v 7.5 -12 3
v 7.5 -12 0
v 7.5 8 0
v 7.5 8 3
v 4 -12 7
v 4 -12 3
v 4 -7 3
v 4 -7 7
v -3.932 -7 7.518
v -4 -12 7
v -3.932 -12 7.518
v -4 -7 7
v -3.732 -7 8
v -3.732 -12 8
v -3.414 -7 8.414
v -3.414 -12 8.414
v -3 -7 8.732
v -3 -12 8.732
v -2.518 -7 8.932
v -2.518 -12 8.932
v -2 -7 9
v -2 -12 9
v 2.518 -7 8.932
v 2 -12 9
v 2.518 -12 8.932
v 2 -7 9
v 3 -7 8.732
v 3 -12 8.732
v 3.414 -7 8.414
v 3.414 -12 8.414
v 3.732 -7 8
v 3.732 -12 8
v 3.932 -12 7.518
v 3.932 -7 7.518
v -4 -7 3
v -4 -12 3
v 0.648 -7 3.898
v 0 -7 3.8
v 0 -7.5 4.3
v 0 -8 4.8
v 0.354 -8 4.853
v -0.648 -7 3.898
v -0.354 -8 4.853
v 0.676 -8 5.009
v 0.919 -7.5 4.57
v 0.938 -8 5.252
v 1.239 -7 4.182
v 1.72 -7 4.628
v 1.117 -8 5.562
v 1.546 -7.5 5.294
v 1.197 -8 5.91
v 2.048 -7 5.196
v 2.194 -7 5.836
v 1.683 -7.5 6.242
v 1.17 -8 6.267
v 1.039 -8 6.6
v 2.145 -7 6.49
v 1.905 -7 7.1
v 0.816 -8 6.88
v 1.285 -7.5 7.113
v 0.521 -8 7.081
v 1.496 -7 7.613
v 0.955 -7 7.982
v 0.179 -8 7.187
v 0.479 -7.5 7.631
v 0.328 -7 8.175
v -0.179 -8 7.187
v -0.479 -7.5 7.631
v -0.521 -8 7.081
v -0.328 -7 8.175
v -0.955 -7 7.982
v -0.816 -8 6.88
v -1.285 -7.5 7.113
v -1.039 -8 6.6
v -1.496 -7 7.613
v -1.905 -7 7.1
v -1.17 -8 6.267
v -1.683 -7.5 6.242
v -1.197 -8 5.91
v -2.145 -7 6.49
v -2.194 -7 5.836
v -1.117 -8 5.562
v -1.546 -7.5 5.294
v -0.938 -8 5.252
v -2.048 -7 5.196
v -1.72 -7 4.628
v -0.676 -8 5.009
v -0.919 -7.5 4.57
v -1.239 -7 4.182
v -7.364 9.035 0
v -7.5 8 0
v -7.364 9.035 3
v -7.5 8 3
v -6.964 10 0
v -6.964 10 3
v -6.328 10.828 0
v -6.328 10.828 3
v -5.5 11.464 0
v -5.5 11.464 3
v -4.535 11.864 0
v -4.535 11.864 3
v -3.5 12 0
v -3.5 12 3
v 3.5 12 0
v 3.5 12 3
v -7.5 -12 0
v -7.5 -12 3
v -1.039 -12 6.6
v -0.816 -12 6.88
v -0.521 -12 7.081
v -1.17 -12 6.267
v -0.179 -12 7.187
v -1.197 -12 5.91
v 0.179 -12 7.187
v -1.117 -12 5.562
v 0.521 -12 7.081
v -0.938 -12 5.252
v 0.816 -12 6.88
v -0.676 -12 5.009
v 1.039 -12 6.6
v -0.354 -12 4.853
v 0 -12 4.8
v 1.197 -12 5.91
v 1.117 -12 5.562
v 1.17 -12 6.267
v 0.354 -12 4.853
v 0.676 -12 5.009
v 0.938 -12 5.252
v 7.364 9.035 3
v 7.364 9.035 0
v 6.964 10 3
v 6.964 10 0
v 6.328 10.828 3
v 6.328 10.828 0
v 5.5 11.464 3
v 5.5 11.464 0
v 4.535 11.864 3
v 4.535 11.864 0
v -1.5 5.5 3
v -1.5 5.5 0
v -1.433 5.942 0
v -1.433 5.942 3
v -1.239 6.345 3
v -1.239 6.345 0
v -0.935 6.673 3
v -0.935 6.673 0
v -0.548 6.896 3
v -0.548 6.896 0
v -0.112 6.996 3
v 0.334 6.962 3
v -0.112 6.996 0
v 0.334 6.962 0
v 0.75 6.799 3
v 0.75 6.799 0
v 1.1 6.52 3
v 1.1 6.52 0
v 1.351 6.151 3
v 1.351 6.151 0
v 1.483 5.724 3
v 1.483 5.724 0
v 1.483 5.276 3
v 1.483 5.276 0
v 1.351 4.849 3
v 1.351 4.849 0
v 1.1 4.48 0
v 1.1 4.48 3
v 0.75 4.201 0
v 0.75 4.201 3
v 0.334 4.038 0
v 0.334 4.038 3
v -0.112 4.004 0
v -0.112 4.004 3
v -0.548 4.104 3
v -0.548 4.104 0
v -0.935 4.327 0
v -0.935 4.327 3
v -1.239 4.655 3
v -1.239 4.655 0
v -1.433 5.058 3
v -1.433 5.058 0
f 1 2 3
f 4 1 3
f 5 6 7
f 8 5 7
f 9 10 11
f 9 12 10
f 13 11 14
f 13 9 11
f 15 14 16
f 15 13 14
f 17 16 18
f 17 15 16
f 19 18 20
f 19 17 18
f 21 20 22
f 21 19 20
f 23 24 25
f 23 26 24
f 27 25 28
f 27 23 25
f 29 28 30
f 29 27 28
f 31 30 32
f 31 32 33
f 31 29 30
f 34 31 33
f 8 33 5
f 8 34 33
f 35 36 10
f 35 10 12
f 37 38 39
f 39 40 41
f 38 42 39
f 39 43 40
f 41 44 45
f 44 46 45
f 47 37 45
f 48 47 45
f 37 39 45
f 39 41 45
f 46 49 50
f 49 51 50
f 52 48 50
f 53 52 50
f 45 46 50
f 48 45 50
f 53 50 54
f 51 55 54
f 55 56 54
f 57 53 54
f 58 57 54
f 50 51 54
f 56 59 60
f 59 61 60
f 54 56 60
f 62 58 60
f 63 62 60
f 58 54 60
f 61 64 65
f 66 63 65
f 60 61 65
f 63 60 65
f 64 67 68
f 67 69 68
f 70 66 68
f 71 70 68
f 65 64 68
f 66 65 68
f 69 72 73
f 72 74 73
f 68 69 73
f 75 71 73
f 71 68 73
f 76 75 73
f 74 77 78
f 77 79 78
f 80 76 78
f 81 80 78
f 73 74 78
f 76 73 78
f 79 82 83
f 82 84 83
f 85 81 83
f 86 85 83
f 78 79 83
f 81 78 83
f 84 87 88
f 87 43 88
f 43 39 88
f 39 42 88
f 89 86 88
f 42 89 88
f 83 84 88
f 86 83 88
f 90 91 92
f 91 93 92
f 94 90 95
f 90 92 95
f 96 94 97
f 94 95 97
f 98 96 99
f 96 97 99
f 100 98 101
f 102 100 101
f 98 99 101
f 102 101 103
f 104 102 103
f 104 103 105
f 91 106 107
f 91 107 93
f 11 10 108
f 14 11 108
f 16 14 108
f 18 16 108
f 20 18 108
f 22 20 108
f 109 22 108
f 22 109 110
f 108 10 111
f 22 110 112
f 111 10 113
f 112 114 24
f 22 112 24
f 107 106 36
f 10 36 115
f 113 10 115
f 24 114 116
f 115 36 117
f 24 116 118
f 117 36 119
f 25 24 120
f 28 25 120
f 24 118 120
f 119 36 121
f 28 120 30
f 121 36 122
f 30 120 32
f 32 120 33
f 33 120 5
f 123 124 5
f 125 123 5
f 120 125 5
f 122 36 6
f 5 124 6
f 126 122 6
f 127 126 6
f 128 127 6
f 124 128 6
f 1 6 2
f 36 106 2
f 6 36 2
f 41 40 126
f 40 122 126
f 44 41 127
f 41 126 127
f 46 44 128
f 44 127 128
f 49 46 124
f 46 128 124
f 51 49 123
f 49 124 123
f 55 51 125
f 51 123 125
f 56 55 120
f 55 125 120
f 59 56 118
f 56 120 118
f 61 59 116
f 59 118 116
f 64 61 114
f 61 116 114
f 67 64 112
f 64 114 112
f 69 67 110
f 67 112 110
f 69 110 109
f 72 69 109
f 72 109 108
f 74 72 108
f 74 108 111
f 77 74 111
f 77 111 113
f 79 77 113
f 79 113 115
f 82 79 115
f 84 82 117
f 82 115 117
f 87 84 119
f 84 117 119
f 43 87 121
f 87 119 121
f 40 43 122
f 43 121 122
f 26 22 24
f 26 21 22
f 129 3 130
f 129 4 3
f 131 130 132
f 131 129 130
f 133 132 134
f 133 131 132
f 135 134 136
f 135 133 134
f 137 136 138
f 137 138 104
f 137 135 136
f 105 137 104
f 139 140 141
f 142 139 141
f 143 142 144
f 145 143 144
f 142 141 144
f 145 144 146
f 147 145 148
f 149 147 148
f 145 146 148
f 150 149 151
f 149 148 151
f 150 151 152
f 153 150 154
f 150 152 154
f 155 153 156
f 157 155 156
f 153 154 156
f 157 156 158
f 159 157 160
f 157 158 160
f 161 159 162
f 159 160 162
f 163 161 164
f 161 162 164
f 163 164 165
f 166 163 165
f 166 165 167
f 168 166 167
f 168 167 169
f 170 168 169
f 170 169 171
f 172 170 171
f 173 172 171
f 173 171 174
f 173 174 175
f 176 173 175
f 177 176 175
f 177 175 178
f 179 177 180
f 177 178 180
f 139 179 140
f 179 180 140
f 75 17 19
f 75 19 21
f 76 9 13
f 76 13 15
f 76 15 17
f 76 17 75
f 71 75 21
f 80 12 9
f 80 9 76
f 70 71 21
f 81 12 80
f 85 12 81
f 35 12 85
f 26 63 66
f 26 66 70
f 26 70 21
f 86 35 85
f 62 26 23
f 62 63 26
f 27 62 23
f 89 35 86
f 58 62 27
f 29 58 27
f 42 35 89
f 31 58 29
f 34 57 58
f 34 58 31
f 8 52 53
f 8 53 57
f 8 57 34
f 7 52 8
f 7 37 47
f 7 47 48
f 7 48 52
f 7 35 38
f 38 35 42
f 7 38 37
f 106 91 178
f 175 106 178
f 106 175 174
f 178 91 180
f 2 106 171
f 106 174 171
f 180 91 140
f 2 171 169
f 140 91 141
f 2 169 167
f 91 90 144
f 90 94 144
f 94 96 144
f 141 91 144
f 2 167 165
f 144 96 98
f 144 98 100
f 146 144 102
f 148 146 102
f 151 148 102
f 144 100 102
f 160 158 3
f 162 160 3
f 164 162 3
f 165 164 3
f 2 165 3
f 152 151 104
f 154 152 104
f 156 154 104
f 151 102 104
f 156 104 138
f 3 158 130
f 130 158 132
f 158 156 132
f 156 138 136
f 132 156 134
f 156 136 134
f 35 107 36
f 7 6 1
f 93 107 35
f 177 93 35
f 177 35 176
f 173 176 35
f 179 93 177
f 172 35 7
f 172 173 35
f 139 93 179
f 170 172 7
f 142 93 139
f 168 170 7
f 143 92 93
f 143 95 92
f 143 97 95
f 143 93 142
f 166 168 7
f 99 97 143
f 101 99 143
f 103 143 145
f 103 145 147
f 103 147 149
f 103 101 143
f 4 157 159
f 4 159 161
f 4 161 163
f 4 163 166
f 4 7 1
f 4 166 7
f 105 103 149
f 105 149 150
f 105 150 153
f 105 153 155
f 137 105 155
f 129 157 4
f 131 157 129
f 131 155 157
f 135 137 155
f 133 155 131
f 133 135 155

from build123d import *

# Parameters (mm, degrees)
SKETCH1_W                                       = 15
SKETCH1_H                                       = 24
BOSS_EXTRUDE1_DEPTH                             = 3
SKETCH2_W                                       = 8
SKETCH2_H                                       = 5
BOSS_EXTRUDE2_DEPTH                             = 6
CSK_FOR_M2_FLAT_HEAD_MACHINE_SCREW1_D           = 2.4
CSK_FOR_M2_FLAT_HEAD_MACHINE_SCREW1_CSINK_D     = 4.4
CSK_FOR_M2_FLAT_HEAD_MACHINE_SCREW1_CSINK_ANGLE = 90
FILLET1_R                                       = 2
SKETCH5_R                                       = 1.5
CUT_EXTRUDE1_DEPTH                              = 3
FILLET2_R                                       = 4


with BuildPart() as part:
    # Sketch1 → Boss-Extrude1 (new body)
    with BuildSketch(Plane.XY):
        Rectangle(SKETCH1_W, SKETCH1_H)
    extrude(amount=BOSS_EXTRUDE1_DEPTH)

    # Sketch2 → Boss-Extrude2 (add)
    with BuildSketch(Plane.XY.offset(3)):
        with Locations((0, -9.5)):
            Rectangle(SKETCH2_W, SKETCH2_H)
    extrude(amount=BOSS_EXTRUDE2_DEPTH)

    # CSK for M2 Flat Head Machine Screw1 (through all)
    with Locations(Plane(origin=(0, -7, 6), x_dir=(0, 0, 1), z_dir=(0, 1, 0))):
        with Locations((0, 0)):
            CounterSinkHole(CSK_FOR_M2_FLAT_HEAD_MACHINE_SCREW1_D / 2, CSK_FOR_M2_FLAT_HEAD_MACHINE_SCREW1_CSINK_D / 2, counter_sink_angle=CSK_FOR_M2_FLAT_HEAD_MACHINE_SCREW1_CSINK_ANGLE)

    # Fillet1
    fillet1_edges = [part.edges().sort_by_distance(p)[0] for p in [
        (-4, -9.5, 9),
        (4, -9.5, 9),
    ]]
    fillet(fillet1_edges, radius=FILLET1_R)

    # Sketch5 → Cut-Extrude1 (cut)
    with BuildSketch(Plane(origin=(0, 0, 0), x_dir=(-1, 0, 0), z_dir=(0, 0, -1))):
        with Locations((0, 5.5)):
            Circle(SKETCH5_R)
    extrude(amount=-CUT_EXTRUDE1_DEPTH, mode=Mode.SUBTRACT)

    # Fillet2
    fillet2_edges = [part.edges().sort_by_distance(p)[0] for p in [
        (-7.5, 12, 1.5),
        (7.5, 12, 1.5),
    ]]
    fillet(fillet2_edges, radius=FILLET2_R)


solid = part.part
